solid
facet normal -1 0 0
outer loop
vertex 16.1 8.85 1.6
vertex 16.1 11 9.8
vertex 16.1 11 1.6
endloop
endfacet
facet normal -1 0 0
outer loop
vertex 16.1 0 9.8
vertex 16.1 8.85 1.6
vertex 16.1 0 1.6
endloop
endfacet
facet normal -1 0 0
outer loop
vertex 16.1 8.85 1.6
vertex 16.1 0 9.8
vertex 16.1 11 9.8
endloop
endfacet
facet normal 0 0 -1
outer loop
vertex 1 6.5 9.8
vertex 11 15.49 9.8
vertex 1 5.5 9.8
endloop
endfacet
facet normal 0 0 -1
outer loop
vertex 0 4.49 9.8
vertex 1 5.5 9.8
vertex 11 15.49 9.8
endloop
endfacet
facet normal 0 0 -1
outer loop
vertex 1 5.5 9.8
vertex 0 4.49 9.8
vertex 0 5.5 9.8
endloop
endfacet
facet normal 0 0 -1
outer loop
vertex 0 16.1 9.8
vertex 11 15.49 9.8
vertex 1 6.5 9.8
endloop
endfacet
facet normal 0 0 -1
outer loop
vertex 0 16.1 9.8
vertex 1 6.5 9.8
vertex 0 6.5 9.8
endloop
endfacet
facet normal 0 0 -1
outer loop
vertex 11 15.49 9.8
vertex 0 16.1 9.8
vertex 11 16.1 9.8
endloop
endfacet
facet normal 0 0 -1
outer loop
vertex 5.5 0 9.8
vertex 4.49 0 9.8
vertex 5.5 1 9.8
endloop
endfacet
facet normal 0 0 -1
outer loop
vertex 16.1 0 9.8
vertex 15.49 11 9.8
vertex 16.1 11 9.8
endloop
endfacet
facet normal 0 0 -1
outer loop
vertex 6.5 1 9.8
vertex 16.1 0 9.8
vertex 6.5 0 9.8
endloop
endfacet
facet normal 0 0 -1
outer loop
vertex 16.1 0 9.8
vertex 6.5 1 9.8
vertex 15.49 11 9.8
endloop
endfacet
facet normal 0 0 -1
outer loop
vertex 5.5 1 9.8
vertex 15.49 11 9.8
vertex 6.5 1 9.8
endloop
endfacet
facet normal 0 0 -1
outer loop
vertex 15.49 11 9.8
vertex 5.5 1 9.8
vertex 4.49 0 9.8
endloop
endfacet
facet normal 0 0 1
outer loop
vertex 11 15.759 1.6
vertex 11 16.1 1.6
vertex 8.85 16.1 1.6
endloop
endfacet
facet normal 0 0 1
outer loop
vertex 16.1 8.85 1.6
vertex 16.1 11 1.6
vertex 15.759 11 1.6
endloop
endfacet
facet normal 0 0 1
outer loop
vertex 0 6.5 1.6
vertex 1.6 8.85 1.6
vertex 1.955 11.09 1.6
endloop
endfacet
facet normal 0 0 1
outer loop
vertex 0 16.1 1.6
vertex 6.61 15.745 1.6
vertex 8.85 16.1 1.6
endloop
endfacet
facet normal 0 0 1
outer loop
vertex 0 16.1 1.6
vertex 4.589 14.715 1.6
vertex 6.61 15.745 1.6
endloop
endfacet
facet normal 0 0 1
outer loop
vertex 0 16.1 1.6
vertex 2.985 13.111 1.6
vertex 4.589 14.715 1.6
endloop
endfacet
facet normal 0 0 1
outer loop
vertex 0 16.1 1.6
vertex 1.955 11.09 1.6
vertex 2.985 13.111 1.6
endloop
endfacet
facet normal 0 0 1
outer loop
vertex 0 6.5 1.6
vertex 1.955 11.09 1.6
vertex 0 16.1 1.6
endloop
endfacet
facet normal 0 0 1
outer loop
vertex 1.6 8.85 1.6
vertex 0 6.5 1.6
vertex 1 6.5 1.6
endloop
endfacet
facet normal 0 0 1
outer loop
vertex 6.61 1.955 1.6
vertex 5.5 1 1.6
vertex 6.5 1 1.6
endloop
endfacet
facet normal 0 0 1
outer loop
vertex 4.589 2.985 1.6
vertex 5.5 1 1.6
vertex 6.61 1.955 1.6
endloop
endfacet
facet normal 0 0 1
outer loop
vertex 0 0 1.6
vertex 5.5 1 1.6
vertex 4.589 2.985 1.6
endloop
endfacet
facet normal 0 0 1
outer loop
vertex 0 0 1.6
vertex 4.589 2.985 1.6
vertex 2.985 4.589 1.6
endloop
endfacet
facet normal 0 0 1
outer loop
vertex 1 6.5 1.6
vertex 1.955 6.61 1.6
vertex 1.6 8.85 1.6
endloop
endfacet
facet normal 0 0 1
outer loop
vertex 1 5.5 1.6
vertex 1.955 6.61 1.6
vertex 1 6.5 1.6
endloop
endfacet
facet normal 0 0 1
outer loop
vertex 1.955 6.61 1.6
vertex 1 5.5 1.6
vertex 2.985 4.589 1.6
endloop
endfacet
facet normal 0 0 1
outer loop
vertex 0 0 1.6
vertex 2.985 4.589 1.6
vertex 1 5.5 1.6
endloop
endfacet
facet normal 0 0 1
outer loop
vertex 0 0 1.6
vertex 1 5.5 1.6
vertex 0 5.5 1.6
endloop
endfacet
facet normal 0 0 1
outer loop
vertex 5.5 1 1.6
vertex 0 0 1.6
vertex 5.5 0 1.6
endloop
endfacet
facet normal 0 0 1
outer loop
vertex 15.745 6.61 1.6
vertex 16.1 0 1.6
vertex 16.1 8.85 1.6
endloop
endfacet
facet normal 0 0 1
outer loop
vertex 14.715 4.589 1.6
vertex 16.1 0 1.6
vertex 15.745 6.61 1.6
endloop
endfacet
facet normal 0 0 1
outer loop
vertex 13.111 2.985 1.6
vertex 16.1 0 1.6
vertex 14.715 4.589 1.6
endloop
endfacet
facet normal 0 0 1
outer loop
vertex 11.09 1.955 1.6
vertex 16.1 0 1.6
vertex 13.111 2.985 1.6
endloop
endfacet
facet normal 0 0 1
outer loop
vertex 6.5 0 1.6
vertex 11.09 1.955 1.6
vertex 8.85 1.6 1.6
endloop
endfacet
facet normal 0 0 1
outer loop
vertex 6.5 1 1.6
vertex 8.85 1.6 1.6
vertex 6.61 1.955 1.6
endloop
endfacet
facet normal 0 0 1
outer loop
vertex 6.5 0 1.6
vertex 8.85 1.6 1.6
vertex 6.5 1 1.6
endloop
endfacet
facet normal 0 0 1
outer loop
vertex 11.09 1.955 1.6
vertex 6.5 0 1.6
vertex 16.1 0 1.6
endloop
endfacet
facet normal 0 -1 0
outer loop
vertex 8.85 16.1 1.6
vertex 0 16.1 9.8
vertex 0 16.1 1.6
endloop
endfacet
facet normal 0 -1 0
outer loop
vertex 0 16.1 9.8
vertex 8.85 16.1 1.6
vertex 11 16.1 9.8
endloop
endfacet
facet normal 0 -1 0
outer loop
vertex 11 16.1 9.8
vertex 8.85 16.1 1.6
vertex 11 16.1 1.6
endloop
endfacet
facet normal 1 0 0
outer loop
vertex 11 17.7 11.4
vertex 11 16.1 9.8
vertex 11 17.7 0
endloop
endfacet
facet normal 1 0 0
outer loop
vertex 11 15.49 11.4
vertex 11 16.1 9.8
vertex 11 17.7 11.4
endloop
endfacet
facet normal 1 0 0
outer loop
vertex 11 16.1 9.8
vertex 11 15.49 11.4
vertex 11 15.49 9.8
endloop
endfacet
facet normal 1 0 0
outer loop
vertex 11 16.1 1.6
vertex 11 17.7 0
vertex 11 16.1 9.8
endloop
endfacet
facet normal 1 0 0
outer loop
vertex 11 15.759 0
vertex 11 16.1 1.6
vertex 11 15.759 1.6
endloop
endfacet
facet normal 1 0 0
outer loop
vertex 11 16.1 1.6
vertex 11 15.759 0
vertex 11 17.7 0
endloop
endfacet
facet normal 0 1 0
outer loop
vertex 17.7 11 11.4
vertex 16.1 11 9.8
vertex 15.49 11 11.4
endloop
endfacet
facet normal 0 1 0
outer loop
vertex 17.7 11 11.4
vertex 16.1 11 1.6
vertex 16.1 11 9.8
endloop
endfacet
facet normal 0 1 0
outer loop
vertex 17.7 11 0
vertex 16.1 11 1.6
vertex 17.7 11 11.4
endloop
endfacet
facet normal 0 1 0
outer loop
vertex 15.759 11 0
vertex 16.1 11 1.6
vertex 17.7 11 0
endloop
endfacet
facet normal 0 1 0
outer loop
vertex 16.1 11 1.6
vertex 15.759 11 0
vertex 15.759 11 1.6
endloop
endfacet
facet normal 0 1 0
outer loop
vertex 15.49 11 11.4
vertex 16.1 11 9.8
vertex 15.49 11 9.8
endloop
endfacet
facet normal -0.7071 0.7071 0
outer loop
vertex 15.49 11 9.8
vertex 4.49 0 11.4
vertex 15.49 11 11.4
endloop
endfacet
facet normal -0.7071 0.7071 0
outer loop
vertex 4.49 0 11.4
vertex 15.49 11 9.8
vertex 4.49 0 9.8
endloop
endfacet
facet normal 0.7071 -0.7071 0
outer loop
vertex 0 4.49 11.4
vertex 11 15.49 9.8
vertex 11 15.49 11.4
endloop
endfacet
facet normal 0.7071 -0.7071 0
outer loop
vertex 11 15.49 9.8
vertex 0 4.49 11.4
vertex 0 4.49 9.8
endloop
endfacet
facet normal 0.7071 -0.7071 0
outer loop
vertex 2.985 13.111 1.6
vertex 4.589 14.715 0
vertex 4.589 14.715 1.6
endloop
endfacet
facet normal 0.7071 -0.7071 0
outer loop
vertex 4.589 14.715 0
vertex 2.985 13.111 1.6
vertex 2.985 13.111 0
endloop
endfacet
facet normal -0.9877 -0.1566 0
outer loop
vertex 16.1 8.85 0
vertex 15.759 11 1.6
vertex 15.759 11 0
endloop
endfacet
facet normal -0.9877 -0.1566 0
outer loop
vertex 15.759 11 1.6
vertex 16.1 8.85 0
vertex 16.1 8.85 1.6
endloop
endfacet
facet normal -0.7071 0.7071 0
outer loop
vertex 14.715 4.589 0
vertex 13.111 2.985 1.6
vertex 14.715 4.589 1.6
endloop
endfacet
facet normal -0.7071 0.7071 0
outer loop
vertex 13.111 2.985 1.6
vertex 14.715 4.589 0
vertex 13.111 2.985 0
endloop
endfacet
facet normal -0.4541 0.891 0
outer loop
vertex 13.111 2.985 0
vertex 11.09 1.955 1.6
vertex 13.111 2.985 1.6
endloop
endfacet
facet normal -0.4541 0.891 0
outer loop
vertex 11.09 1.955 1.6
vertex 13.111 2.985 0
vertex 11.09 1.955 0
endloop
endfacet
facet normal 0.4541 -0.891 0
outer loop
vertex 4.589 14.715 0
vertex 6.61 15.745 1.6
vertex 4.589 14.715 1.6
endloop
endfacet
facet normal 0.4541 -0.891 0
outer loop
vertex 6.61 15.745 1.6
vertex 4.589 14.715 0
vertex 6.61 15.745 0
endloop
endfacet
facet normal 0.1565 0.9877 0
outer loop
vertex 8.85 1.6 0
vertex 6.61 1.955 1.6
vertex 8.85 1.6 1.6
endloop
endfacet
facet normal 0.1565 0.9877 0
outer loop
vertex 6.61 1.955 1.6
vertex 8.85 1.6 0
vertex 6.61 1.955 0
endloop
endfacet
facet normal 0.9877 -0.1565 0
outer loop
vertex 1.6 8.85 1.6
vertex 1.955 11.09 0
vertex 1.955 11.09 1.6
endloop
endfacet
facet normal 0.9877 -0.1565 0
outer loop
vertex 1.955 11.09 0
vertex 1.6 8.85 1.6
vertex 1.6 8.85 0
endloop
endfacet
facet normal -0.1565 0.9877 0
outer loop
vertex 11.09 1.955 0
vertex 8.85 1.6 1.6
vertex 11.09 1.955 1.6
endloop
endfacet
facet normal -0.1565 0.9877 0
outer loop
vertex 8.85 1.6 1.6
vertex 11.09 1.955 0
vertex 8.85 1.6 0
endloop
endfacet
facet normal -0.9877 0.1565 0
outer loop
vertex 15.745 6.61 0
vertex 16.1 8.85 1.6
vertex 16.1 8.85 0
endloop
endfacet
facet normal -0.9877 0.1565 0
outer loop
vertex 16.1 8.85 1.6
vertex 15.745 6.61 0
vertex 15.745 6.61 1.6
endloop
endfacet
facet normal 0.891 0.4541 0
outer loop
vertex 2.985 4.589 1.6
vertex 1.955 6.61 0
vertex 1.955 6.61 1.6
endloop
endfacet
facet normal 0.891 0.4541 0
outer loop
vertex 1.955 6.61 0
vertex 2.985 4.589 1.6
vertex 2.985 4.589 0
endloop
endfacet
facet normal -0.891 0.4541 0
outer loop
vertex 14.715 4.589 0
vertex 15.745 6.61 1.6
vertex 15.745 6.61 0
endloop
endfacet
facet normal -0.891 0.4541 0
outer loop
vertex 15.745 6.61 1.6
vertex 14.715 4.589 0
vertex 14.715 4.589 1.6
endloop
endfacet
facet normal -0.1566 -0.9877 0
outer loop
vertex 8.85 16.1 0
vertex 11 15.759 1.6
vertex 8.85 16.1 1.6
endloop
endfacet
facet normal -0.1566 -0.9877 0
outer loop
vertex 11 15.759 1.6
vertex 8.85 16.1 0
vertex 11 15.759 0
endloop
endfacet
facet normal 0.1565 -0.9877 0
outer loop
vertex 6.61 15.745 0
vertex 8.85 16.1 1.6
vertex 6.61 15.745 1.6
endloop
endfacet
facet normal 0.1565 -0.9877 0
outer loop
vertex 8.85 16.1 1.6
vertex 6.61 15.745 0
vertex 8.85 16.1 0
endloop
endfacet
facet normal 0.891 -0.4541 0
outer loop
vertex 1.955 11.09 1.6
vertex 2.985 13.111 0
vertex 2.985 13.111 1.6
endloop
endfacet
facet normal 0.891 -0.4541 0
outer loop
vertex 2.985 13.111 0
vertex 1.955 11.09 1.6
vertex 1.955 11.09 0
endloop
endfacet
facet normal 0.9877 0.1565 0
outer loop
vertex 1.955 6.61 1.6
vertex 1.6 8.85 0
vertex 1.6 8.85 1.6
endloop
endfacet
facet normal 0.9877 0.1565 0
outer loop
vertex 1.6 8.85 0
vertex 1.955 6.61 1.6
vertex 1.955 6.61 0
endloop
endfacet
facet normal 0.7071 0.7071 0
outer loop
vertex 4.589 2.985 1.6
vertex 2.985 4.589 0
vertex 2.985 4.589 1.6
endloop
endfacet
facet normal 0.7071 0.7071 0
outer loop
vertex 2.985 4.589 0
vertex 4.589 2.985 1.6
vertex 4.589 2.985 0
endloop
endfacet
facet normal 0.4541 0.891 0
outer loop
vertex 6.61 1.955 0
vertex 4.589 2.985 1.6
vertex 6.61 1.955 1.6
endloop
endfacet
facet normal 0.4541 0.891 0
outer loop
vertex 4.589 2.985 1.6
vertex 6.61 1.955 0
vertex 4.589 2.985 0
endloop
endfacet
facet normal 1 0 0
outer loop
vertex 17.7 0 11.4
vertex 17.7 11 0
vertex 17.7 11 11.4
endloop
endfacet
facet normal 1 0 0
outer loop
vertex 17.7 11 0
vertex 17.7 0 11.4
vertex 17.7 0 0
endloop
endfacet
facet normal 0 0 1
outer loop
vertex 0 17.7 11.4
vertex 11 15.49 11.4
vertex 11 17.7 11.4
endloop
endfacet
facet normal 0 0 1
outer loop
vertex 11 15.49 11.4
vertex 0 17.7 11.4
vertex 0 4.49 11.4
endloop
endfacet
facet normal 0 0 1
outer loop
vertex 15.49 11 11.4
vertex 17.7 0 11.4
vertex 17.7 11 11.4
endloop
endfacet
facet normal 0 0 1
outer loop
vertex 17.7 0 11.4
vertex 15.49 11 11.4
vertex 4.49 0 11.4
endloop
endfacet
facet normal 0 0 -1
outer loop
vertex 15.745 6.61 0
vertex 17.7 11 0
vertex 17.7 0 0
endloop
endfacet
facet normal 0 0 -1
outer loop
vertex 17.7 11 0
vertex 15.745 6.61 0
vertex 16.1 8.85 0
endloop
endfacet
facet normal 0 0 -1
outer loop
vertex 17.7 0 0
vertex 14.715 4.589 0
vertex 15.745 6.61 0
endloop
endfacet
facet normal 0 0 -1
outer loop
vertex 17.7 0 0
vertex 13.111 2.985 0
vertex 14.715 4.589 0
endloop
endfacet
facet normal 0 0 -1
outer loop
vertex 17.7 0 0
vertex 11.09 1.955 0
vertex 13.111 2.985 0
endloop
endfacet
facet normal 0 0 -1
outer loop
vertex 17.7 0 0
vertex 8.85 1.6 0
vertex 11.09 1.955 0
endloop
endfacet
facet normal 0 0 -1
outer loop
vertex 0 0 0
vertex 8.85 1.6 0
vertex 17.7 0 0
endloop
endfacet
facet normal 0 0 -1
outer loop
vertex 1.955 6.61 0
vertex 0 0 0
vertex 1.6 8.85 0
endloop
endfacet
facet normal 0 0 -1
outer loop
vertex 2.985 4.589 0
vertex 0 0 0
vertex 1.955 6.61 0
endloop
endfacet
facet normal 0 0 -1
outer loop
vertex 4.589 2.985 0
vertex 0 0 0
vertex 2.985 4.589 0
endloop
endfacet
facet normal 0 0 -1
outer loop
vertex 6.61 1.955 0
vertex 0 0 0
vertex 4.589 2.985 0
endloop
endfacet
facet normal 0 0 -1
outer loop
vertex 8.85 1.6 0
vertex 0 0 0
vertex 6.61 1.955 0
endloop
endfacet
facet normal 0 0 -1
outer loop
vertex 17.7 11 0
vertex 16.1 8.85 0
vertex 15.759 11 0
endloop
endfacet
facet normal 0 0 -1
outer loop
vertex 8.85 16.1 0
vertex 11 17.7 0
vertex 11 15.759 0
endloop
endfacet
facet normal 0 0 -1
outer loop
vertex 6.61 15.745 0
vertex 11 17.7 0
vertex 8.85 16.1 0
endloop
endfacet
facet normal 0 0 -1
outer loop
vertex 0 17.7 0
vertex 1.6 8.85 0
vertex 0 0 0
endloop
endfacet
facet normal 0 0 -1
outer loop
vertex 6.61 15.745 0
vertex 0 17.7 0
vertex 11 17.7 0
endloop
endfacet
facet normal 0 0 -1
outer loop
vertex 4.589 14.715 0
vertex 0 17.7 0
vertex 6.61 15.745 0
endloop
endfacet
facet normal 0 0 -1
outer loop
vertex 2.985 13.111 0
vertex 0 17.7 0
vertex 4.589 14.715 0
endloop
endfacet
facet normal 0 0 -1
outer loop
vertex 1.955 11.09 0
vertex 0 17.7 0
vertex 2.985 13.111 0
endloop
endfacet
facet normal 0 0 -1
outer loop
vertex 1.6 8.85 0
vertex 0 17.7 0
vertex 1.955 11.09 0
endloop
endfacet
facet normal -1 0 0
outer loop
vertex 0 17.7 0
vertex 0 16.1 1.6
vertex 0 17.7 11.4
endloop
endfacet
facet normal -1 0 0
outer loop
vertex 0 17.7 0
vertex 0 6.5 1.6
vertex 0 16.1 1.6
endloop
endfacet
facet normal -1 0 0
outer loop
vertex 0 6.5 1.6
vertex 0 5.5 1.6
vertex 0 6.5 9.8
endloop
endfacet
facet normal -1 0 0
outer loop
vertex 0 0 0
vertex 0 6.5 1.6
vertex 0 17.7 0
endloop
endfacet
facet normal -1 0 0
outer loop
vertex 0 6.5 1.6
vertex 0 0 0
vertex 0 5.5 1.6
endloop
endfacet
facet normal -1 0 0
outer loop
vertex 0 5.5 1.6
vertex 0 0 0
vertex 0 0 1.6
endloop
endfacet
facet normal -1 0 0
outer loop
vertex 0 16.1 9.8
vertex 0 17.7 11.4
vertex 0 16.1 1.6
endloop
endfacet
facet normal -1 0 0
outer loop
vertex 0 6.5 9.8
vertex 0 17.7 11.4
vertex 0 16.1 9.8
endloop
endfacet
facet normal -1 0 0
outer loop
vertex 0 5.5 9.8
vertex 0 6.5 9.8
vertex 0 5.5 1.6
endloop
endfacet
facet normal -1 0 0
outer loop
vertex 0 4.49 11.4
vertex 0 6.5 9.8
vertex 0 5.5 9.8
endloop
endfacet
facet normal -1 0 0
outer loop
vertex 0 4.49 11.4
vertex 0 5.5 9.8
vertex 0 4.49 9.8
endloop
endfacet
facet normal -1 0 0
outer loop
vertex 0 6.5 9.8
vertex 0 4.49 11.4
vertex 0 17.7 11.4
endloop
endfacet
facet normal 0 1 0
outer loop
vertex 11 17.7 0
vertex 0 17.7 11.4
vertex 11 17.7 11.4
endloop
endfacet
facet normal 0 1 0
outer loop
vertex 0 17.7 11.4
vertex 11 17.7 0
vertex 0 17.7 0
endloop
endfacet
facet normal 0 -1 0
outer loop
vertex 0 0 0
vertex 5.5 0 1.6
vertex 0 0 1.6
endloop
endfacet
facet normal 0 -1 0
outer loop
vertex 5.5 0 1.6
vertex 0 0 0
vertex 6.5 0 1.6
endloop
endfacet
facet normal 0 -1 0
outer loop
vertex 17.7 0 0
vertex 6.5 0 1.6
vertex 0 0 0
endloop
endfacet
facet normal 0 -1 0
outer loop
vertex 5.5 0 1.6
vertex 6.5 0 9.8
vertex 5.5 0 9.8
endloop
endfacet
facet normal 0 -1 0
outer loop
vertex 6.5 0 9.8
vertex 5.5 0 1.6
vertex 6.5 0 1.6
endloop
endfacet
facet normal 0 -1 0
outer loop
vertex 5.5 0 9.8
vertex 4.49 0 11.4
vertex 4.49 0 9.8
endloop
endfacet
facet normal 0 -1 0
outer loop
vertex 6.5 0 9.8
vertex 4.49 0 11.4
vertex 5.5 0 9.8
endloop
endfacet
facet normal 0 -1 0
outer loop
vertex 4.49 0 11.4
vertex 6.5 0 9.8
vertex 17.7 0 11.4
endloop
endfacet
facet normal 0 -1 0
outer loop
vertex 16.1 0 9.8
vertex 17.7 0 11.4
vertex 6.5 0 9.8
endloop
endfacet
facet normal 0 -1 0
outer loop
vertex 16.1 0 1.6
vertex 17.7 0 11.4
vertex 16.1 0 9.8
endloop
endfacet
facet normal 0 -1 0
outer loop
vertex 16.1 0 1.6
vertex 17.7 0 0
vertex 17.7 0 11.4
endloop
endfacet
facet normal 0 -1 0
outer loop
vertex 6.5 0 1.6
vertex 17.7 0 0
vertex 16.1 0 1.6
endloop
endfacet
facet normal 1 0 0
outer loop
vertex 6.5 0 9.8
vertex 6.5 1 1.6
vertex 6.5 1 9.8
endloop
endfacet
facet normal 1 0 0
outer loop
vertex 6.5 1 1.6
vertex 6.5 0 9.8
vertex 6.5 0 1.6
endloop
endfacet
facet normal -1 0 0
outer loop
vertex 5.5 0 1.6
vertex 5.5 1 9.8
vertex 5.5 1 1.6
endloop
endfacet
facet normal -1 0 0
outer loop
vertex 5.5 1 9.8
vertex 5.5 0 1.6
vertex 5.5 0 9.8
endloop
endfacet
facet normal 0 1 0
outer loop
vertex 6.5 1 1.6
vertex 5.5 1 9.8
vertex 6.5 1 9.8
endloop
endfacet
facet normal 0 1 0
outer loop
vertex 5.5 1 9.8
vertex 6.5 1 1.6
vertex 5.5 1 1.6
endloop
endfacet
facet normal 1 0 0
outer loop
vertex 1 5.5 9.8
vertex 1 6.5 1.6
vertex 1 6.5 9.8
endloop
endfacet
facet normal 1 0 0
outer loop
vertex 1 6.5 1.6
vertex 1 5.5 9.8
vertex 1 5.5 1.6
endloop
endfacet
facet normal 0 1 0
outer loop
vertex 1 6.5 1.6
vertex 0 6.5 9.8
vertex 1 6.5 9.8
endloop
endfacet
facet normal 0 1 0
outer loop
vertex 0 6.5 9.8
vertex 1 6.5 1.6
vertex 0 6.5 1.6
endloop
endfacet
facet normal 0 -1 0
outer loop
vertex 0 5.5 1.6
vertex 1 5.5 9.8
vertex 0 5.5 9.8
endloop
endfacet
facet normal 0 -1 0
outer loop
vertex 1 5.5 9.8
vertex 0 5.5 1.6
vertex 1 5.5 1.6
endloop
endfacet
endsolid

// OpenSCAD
// 15 mm
// 8 mm 
// 7 mm opening
// 1.5 mm thick

/*
difference() {
    cube([15,15,1.5]);
    
    translate([-epsilon,-epsilon,-epsilon]) cube([7+epsilon,7+epsilon,1.5+2*epsilon]);
}

translate([7,0,0]) cube([8,1.5,11.1]);

translate([1.5,7,0]) rotate([0,0,90]) cube([8,1.5,11.1]);
*/

$fn=20;
margin = 0.2;

washer_dia = 14.2+0.3;
thickness = 1.6;

width = washer_dia+2*thickness;
mirror_bed_thickness = 8;
height = mirror_bed_thickness+2*thickness+margin; // 11.1
edge_wall = 11;
screw_width = 6.35; // really 6.25
epsilon = 0.1;

difference() {
    cube([width,width,height]);
    
    union() {
        // remove center
        translate([-epsilon,-epsilon,thickness]) cube([width-thickness+epsilon,width-thickness+epsilon,height-2*thickness]);
    
        // remove corner edge
        translate([edge_wall,edge_wall,-epsilon]) cube([width-edge_wall+epsilon, width-edge_wall+epsilon, height+2*epsilon]);
        
        // slot in the top
        rotate([0,0,-45]) translate([-screw_width/2,0,height-thickness-epsilon]) cube([screw_width, 30, thickness+2*epsilon]); 
        
        // iron ring
        translate([washer_dia/2+thickness,washer_dia/2+thickness,-epsilon]) cylinder(d=washer_dia, h=thickness+2*epsilon);

    }
}

// support
translate([5.5,0,0]) cube([1,1,height]);
translate([0,5.5,0]) cube([1,1,height]);
